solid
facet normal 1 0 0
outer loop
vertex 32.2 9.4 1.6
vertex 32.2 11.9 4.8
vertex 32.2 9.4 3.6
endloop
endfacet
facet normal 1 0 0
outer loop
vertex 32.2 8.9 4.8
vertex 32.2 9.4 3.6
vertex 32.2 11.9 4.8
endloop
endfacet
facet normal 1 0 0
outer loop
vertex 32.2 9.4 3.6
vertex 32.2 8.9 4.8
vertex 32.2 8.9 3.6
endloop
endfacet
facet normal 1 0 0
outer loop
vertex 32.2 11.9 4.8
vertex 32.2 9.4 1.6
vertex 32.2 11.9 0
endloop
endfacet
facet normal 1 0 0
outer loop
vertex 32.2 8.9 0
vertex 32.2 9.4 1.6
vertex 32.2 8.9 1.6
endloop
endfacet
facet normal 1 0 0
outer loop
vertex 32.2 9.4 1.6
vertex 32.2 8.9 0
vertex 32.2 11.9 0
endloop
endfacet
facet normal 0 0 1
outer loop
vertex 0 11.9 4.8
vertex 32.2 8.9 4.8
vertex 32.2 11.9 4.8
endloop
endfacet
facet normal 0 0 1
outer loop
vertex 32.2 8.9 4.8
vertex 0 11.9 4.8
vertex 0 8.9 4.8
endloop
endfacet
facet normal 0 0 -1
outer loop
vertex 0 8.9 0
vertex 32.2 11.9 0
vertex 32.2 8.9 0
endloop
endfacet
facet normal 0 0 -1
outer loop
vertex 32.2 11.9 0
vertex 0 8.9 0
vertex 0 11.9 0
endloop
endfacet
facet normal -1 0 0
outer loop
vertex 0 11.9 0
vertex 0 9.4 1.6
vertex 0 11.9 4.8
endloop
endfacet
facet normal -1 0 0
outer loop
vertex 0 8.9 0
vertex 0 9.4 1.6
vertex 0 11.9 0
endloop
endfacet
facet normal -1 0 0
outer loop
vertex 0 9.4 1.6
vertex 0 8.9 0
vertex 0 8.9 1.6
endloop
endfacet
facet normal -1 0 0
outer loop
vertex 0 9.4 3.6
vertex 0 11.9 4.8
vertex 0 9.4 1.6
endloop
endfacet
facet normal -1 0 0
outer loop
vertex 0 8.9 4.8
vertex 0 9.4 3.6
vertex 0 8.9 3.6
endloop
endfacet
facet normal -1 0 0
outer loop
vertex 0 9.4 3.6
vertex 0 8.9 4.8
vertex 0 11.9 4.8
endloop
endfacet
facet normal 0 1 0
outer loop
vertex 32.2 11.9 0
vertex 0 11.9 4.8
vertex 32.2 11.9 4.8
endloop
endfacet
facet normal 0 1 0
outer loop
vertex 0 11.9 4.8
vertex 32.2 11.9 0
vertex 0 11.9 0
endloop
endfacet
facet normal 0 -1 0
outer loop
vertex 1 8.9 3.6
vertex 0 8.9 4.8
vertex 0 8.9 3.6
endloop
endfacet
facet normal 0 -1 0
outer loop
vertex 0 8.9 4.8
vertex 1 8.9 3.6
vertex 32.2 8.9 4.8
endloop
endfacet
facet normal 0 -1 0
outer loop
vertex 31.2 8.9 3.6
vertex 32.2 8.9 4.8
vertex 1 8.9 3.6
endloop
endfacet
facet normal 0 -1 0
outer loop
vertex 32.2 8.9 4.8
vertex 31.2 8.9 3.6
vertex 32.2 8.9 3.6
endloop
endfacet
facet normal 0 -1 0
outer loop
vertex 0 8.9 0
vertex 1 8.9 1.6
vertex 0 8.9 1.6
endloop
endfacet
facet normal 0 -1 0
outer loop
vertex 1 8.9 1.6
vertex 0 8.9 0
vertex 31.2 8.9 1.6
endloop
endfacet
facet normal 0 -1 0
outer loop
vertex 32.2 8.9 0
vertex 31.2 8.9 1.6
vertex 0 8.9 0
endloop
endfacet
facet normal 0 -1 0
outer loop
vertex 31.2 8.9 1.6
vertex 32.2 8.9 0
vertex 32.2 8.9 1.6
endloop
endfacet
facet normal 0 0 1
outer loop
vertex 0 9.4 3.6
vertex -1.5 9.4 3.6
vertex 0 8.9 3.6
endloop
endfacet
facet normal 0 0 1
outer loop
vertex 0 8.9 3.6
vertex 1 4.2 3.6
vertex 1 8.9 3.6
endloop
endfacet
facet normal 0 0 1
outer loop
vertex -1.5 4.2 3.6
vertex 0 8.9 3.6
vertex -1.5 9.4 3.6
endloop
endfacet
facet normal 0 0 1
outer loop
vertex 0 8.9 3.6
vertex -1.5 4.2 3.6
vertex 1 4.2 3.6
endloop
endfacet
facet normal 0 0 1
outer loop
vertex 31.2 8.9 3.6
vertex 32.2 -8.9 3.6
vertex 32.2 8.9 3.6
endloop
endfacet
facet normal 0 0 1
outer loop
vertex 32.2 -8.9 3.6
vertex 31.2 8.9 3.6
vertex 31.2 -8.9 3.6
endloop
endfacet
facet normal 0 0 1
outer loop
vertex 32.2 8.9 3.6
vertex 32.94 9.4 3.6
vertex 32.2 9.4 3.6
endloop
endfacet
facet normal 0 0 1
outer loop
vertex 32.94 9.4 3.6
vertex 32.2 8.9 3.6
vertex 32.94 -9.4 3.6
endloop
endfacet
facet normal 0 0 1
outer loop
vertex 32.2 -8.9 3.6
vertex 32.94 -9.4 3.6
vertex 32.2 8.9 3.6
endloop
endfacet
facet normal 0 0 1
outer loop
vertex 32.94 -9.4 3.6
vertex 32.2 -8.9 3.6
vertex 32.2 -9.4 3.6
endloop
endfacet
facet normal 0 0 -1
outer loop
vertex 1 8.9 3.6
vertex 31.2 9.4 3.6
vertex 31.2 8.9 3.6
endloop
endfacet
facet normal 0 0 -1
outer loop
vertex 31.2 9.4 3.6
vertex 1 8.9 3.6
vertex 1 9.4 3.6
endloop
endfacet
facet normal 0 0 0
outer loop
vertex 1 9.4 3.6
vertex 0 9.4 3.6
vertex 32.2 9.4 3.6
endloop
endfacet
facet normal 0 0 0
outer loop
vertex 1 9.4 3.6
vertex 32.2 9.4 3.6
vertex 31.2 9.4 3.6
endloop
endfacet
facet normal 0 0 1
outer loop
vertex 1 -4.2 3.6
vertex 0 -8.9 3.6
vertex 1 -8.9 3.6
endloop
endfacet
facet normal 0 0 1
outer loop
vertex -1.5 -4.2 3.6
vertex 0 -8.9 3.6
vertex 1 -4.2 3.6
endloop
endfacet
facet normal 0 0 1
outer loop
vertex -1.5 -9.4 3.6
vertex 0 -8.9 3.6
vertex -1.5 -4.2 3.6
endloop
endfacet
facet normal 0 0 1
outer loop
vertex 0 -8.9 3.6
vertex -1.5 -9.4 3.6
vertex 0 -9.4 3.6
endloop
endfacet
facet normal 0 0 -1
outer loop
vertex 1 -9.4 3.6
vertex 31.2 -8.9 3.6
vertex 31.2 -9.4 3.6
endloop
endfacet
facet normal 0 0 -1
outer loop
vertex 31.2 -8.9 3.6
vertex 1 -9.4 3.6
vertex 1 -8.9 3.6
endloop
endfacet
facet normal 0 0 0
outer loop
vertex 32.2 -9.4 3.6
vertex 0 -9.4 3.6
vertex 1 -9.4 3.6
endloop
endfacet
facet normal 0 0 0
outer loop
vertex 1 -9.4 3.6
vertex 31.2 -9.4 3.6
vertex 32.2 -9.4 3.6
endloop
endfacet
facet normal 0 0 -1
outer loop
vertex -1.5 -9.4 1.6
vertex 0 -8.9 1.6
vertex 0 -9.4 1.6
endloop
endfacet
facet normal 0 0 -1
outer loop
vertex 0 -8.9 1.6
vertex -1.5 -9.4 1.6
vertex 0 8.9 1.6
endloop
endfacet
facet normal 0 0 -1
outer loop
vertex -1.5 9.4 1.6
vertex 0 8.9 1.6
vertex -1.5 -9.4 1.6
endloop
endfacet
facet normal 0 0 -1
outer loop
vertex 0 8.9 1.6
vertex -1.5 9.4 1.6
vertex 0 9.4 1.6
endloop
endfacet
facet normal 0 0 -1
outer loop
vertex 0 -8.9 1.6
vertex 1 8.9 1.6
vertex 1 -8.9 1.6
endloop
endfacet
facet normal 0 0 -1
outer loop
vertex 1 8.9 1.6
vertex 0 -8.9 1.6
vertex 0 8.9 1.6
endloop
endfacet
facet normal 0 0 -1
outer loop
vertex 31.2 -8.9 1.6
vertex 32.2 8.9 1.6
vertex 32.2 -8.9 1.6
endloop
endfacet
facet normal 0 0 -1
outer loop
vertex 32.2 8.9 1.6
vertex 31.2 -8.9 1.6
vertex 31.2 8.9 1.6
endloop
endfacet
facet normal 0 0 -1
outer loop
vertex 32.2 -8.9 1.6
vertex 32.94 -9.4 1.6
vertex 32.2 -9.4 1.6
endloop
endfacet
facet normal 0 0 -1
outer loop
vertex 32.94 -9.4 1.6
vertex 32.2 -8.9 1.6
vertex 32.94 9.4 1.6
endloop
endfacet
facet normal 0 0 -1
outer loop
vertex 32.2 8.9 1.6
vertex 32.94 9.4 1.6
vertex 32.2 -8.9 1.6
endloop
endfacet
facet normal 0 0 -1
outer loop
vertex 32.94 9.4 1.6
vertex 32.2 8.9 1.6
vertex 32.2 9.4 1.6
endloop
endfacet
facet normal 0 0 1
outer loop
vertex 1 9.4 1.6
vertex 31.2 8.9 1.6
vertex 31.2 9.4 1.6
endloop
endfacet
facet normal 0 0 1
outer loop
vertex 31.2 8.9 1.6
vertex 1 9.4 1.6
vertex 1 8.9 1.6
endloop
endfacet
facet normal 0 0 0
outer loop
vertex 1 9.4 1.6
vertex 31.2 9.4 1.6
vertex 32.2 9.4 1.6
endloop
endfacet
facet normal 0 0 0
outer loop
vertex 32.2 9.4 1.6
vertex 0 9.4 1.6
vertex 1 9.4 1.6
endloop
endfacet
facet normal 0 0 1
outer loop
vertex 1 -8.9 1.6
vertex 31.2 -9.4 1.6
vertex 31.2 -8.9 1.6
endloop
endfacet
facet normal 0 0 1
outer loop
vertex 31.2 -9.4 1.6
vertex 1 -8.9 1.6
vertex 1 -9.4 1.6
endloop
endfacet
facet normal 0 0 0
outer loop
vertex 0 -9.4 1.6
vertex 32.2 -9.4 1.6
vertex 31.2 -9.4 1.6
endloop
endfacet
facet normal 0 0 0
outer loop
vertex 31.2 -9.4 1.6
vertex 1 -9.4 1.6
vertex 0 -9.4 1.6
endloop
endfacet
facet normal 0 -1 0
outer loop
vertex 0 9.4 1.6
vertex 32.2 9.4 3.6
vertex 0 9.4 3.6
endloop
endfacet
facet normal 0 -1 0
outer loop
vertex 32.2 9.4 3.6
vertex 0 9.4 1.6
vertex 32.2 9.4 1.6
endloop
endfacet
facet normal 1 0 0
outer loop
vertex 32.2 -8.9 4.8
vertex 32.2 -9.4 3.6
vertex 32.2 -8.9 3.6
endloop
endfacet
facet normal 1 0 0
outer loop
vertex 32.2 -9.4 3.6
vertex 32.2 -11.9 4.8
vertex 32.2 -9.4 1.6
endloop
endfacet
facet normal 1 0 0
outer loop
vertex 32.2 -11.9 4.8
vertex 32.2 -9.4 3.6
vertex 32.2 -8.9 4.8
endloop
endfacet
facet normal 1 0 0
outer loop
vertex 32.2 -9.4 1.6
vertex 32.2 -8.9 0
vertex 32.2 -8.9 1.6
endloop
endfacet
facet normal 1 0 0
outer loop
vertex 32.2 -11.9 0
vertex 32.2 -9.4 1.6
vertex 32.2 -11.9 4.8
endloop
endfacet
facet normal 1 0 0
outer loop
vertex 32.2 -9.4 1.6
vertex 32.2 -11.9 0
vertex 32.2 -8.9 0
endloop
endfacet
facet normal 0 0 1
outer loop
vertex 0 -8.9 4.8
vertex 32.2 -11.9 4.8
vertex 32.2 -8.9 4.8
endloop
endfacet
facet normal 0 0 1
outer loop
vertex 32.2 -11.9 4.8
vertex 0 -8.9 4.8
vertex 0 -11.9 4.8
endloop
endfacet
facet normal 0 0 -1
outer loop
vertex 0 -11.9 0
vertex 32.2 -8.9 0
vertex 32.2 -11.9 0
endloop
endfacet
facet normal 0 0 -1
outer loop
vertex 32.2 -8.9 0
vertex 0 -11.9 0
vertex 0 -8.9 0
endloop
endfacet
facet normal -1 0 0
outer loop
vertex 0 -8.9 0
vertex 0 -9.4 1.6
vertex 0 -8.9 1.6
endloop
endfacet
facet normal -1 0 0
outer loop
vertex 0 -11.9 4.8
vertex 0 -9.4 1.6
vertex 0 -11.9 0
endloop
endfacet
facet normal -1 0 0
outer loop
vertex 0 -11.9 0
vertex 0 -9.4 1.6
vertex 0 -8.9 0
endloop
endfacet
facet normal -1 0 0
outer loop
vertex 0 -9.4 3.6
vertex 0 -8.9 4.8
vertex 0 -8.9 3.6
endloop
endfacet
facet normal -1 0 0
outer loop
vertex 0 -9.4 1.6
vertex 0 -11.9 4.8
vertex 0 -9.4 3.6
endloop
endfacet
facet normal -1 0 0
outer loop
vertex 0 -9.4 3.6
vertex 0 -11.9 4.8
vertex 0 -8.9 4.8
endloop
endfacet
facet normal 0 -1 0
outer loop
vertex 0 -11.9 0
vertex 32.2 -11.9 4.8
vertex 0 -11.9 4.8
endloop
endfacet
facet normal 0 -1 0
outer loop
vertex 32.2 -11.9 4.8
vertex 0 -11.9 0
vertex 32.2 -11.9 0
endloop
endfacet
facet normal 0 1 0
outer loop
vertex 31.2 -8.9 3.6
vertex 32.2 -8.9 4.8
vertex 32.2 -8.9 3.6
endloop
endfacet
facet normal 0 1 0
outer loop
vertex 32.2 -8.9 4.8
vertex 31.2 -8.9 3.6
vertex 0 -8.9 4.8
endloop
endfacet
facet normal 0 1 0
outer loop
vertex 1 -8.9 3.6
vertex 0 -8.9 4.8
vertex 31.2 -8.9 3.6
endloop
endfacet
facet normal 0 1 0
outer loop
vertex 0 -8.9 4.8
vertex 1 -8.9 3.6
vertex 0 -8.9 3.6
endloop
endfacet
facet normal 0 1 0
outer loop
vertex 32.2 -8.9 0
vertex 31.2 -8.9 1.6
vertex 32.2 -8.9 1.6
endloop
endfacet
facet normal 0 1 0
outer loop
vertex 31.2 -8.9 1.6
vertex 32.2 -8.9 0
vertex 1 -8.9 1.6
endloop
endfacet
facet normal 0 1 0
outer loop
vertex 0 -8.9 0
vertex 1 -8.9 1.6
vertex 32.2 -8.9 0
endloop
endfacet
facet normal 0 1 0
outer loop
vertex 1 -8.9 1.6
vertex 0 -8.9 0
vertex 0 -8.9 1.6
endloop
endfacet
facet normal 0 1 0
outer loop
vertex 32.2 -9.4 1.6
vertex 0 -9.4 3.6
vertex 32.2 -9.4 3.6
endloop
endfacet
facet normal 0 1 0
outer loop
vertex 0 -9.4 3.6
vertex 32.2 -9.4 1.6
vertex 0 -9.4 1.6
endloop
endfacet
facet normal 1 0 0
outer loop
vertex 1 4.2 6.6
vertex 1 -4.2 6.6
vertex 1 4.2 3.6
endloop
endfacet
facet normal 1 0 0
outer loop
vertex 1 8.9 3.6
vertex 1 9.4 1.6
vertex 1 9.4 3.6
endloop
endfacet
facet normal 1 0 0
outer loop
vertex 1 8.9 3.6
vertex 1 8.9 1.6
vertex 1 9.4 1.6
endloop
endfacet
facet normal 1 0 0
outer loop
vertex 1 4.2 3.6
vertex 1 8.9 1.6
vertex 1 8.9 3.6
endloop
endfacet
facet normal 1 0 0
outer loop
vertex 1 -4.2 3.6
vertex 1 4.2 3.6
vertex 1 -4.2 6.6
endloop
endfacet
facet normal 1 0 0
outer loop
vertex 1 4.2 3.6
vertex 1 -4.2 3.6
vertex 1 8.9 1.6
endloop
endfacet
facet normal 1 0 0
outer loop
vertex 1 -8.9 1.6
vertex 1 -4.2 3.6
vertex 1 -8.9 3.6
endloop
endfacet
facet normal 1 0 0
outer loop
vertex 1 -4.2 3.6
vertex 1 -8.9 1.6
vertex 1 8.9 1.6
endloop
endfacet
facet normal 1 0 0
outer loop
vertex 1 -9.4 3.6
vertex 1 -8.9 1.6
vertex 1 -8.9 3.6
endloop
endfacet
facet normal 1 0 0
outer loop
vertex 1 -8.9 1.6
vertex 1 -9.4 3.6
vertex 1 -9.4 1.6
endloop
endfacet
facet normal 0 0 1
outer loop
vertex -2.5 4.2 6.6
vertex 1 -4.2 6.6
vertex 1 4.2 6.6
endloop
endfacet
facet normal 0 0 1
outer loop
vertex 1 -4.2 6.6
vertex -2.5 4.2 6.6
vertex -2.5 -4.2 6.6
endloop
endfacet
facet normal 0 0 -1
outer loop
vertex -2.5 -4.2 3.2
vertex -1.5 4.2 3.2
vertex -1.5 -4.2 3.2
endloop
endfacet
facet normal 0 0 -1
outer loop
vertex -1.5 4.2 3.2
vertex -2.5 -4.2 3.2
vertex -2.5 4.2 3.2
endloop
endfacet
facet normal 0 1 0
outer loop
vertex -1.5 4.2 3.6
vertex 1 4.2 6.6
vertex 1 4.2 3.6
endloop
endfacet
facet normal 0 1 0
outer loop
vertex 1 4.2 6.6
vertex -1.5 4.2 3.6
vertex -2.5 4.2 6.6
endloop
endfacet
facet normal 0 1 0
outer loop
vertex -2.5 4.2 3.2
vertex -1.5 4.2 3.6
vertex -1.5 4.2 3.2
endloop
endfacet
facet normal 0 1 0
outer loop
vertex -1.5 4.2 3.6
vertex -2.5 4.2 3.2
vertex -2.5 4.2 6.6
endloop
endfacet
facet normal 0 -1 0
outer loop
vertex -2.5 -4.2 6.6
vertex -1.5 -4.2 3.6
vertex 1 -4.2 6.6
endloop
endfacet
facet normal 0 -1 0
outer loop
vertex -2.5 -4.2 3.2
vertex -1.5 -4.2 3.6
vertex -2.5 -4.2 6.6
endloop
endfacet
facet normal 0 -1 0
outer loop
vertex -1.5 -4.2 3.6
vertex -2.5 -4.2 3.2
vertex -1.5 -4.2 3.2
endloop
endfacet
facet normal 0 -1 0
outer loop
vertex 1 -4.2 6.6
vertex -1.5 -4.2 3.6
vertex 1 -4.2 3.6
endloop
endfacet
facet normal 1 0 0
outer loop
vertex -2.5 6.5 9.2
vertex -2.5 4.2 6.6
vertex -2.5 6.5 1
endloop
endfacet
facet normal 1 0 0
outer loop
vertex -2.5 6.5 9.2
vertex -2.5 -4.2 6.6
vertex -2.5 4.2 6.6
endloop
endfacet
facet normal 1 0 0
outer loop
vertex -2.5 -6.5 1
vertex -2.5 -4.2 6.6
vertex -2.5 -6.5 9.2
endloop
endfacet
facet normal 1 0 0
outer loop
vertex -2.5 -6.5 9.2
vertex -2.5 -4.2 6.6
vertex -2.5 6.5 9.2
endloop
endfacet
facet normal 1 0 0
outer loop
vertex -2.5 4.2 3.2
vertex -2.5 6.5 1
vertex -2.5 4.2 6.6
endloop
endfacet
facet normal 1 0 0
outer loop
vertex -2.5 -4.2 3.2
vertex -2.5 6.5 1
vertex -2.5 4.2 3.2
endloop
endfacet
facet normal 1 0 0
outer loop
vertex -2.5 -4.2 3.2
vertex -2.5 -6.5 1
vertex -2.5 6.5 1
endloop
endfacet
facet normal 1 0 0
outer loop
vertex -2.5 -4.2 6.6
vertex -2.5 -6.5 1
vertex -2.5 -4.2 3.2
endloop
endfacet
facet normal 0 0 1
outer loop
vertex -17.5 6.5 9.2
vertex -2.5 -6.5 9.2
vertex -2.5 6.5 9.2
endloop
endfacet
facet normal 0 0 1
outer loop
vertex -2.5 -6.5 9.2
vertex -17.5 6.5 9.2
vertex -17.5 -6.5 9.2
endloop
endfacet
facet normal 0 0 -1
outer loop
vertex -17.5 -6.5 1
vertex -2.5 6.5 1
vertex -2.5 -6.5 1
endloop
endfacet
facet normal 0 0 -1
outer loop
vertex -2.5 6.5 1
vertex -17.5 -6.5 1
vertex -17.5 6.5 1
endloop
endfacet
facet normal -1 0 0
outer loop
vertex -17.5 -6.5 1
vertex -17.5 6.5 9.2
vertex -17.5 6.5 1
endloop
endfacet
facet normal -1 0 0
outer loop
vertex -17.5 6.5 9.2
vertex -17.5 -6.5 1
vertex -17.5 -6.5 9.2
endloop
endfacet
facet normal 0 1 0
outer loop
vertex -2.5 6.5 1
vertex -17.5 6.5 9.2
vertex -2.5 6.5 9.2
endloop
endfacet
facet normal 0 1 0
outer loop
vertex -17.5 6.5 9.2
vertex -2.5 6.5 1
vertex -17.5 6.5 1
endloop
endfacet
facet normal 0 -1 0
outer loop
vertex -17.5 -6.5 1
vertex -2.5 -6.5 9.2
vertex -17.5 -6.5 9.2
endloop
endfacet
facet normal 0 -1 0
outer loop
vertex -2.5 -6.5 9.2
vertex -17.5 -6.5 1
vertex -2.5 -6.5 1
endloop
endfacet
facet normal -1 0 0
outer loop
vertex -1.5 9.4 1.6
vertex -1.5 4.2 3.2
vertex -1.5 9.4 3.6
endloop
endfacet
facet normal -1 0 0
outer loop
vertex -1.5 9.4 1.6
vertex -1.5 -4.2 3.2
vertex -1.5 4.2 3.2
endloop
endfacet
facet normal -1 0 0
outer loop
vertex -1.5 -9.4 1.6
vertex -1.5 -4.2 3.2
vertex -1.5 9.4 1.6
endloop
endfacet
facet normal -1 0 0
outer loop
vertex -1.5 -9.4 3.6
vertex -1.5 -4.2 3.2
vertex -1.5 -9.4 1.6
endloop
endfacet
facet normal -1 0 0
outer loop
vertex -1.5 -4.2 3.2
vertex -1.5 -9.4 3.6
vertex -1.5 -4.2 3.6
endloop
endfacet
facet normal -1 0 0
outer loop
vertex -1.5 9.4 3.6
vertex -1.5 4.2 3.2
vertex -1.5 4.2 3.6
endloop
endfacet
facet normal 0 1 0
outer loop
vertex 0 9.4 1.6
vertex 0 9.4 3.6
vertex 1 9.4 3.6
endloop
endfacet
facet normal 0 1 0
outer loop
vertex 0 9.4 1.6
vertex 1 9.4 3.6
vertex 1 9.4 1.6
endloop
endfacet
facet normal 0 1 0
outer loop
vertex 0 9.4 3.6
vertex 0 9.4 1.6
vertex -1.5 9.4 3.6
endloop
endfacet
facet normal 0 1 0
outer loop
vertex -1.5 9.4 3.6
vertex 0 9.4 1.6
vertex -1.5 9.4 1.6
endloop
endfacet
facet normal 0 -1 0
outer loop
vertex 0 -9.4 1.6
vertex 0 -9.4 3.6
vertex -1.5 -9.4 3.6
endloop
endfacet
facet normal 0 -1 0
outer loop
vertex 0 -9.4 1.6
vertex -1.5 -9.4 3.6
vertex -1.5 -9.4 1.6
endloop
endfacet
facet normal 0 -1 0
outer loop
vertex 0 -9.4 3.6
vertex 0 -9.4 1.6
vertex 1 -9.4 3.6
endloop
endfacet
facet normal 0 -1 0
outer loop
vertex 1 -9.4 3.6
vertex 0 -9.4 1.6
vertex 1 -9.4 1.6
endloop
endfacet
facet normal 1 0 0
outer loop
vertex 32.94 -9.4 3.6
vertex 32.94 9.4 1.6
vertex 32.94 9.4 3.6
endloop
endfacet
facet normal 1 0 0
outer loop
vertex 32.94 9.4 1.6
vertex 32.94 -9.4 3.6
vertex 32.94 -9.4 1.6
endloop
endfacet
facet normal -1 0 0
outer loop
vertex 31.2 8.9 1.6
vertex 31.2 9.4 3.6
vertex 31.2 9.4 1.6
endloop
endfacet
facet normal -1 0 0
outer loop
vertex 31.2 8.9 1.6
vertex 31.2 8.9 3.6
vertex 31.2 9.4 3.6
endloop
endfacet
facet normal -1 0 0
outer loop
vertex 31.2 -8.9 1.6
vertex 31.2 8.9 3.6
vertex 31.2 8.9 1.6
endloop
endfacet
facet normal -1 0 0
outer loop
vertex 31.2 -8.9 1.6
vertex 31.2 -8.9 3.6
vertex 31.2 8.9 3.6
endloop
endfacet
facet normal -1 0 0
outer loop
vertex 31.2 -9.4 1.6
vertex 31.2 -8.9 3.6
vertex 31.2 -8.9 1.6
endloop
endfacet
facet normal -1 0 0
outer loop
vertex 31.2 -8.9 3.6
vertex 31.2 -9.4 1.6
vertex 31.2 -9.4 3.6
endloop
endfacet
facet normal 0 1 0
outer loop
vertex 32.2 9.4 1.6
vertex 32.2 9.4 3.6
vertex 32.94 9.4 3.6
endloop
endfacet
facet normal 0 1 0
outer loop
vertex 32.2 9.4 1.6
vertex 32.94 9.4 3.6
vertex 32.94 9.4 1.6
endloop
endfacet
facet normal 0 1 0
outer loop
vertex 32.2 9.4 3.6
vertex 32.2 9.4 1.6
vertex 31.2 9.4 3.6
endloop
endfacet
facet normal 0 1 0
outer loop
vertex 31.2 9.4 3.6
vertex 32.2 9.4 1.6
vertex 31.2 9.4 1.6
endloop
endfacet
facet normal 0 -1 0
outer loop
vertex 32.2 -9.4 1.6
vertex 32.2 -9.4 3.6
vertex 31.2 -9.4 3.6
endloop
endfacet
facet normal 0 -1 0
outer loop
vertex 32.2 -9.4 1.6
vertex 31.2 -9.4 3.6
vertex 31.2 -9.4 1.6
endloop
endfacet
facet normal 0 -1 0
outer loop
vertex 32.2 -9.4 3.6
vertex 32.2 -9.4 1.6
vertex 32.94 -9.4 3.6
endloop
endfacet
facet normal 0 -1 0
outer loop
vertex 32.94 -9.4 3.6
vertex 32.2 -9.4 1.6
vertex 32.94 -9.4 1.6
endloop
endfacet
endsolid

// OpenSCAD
// Pro-Micro dimensions: 18.5mm×33.5mm ground plate (USB socket juts out by 1.9mm)
// PCB is 1.5 mm thick. We can use only 0.5mm for a notch.
// The PCB is mounted 1mm above the ground plate.
//
// USB-socket dimensions:
//  8mm width
//  3mm height
//  mounted directly on the PCB without gap
//
// z=0 is the surface of the base where this mount is placed on
// x/y = 0/0 is the center of the USB socket front
// The Pro Micro is lying on the x/y plane and the USB-socket-to-reset-button axis is the x-axis.
// The USB-Plug is at x=0
//
// x is “width”
// y is “length”


notch_depth = 0.5;
notch_bar_width = 3;
notch_bar_height = 4.8;
notch_bottom_level = 1.6;
notch_height = 2;     // = PCB thickness

ground_plate_width = 26;
ground_plate_length = 35;
ground_plate_thickness = 1;

promic_width = 18.8; 
promic_length = 33.7;

front_notch_depth = 1.5;

usb_socket_width = 8.4;
usb_socket_height = 3.4;
usb_socket_depth = 2; // also smaller cut-away for the USB-plug
usb_plug_width = 13;
usb_plug_height = 8.2;
usb_plug_cutaway_bottom_level = 1;

module notch_bar() {
    // the main notch bar
    difference() {
        cube([promic_length - front_notch_depth, notch_bar_width, notch_bar_height]);
        color("yellow")
            translate([-0.5, -1, notch_bottom_level])
                cube([promic_length - front_notch_depth + 1, notch_depth + 1, notch_height]);
    }
}

module front_notch() {
    color("orange") 
        translate([-front_notch_depth, -promic_width/2, notch_bottom_level])
            cube([front_notch_depth + 1, promic_width, notch_height]);
}

module usb_cut_away() {
    color("red")
        translate([
            -usb_socket_depth - front_notch_depth -1,
            -usb_socket_width/2,
            notch_bottom_level + notch_height - 0.4
        ])
            cube([usb_socket_depth + front_notch_depth + 2, usb_socket_width, usb_socket_height]);
    color("yellow")
        translate([
            -14 - usb_socket_depth - front_notch_depth,
            -usb_plug_width/2,
            usb_plug_cutaway_bottom_level
        ])
            cube([15, usb_plug_width, usb_plug_height]);
}


module promic_mount() {
    // notch bars
    translate([0, promic_width/2 - notch_depth]) notch_bar();
    translate([0, -promic_width/2 + notch_depth]) mirror([0,1,0]) notch_bar();
}

module promic_front_cutaway() {
    front_notch();
    usb_cut_away();
}

module promic_back_notch() {
    translate([promic_length - front_notch_depth, notch_depth-promic_width/2, 0]) {
        translate([-1, -notch_depth, notch_bottom_level])
            color("pink")
                cube([notch_depth + 0.24 + 1, promic_width, notch_height]);
    }
}

promic_mount();
promic_front_cutaway();
promic_back_notch();
